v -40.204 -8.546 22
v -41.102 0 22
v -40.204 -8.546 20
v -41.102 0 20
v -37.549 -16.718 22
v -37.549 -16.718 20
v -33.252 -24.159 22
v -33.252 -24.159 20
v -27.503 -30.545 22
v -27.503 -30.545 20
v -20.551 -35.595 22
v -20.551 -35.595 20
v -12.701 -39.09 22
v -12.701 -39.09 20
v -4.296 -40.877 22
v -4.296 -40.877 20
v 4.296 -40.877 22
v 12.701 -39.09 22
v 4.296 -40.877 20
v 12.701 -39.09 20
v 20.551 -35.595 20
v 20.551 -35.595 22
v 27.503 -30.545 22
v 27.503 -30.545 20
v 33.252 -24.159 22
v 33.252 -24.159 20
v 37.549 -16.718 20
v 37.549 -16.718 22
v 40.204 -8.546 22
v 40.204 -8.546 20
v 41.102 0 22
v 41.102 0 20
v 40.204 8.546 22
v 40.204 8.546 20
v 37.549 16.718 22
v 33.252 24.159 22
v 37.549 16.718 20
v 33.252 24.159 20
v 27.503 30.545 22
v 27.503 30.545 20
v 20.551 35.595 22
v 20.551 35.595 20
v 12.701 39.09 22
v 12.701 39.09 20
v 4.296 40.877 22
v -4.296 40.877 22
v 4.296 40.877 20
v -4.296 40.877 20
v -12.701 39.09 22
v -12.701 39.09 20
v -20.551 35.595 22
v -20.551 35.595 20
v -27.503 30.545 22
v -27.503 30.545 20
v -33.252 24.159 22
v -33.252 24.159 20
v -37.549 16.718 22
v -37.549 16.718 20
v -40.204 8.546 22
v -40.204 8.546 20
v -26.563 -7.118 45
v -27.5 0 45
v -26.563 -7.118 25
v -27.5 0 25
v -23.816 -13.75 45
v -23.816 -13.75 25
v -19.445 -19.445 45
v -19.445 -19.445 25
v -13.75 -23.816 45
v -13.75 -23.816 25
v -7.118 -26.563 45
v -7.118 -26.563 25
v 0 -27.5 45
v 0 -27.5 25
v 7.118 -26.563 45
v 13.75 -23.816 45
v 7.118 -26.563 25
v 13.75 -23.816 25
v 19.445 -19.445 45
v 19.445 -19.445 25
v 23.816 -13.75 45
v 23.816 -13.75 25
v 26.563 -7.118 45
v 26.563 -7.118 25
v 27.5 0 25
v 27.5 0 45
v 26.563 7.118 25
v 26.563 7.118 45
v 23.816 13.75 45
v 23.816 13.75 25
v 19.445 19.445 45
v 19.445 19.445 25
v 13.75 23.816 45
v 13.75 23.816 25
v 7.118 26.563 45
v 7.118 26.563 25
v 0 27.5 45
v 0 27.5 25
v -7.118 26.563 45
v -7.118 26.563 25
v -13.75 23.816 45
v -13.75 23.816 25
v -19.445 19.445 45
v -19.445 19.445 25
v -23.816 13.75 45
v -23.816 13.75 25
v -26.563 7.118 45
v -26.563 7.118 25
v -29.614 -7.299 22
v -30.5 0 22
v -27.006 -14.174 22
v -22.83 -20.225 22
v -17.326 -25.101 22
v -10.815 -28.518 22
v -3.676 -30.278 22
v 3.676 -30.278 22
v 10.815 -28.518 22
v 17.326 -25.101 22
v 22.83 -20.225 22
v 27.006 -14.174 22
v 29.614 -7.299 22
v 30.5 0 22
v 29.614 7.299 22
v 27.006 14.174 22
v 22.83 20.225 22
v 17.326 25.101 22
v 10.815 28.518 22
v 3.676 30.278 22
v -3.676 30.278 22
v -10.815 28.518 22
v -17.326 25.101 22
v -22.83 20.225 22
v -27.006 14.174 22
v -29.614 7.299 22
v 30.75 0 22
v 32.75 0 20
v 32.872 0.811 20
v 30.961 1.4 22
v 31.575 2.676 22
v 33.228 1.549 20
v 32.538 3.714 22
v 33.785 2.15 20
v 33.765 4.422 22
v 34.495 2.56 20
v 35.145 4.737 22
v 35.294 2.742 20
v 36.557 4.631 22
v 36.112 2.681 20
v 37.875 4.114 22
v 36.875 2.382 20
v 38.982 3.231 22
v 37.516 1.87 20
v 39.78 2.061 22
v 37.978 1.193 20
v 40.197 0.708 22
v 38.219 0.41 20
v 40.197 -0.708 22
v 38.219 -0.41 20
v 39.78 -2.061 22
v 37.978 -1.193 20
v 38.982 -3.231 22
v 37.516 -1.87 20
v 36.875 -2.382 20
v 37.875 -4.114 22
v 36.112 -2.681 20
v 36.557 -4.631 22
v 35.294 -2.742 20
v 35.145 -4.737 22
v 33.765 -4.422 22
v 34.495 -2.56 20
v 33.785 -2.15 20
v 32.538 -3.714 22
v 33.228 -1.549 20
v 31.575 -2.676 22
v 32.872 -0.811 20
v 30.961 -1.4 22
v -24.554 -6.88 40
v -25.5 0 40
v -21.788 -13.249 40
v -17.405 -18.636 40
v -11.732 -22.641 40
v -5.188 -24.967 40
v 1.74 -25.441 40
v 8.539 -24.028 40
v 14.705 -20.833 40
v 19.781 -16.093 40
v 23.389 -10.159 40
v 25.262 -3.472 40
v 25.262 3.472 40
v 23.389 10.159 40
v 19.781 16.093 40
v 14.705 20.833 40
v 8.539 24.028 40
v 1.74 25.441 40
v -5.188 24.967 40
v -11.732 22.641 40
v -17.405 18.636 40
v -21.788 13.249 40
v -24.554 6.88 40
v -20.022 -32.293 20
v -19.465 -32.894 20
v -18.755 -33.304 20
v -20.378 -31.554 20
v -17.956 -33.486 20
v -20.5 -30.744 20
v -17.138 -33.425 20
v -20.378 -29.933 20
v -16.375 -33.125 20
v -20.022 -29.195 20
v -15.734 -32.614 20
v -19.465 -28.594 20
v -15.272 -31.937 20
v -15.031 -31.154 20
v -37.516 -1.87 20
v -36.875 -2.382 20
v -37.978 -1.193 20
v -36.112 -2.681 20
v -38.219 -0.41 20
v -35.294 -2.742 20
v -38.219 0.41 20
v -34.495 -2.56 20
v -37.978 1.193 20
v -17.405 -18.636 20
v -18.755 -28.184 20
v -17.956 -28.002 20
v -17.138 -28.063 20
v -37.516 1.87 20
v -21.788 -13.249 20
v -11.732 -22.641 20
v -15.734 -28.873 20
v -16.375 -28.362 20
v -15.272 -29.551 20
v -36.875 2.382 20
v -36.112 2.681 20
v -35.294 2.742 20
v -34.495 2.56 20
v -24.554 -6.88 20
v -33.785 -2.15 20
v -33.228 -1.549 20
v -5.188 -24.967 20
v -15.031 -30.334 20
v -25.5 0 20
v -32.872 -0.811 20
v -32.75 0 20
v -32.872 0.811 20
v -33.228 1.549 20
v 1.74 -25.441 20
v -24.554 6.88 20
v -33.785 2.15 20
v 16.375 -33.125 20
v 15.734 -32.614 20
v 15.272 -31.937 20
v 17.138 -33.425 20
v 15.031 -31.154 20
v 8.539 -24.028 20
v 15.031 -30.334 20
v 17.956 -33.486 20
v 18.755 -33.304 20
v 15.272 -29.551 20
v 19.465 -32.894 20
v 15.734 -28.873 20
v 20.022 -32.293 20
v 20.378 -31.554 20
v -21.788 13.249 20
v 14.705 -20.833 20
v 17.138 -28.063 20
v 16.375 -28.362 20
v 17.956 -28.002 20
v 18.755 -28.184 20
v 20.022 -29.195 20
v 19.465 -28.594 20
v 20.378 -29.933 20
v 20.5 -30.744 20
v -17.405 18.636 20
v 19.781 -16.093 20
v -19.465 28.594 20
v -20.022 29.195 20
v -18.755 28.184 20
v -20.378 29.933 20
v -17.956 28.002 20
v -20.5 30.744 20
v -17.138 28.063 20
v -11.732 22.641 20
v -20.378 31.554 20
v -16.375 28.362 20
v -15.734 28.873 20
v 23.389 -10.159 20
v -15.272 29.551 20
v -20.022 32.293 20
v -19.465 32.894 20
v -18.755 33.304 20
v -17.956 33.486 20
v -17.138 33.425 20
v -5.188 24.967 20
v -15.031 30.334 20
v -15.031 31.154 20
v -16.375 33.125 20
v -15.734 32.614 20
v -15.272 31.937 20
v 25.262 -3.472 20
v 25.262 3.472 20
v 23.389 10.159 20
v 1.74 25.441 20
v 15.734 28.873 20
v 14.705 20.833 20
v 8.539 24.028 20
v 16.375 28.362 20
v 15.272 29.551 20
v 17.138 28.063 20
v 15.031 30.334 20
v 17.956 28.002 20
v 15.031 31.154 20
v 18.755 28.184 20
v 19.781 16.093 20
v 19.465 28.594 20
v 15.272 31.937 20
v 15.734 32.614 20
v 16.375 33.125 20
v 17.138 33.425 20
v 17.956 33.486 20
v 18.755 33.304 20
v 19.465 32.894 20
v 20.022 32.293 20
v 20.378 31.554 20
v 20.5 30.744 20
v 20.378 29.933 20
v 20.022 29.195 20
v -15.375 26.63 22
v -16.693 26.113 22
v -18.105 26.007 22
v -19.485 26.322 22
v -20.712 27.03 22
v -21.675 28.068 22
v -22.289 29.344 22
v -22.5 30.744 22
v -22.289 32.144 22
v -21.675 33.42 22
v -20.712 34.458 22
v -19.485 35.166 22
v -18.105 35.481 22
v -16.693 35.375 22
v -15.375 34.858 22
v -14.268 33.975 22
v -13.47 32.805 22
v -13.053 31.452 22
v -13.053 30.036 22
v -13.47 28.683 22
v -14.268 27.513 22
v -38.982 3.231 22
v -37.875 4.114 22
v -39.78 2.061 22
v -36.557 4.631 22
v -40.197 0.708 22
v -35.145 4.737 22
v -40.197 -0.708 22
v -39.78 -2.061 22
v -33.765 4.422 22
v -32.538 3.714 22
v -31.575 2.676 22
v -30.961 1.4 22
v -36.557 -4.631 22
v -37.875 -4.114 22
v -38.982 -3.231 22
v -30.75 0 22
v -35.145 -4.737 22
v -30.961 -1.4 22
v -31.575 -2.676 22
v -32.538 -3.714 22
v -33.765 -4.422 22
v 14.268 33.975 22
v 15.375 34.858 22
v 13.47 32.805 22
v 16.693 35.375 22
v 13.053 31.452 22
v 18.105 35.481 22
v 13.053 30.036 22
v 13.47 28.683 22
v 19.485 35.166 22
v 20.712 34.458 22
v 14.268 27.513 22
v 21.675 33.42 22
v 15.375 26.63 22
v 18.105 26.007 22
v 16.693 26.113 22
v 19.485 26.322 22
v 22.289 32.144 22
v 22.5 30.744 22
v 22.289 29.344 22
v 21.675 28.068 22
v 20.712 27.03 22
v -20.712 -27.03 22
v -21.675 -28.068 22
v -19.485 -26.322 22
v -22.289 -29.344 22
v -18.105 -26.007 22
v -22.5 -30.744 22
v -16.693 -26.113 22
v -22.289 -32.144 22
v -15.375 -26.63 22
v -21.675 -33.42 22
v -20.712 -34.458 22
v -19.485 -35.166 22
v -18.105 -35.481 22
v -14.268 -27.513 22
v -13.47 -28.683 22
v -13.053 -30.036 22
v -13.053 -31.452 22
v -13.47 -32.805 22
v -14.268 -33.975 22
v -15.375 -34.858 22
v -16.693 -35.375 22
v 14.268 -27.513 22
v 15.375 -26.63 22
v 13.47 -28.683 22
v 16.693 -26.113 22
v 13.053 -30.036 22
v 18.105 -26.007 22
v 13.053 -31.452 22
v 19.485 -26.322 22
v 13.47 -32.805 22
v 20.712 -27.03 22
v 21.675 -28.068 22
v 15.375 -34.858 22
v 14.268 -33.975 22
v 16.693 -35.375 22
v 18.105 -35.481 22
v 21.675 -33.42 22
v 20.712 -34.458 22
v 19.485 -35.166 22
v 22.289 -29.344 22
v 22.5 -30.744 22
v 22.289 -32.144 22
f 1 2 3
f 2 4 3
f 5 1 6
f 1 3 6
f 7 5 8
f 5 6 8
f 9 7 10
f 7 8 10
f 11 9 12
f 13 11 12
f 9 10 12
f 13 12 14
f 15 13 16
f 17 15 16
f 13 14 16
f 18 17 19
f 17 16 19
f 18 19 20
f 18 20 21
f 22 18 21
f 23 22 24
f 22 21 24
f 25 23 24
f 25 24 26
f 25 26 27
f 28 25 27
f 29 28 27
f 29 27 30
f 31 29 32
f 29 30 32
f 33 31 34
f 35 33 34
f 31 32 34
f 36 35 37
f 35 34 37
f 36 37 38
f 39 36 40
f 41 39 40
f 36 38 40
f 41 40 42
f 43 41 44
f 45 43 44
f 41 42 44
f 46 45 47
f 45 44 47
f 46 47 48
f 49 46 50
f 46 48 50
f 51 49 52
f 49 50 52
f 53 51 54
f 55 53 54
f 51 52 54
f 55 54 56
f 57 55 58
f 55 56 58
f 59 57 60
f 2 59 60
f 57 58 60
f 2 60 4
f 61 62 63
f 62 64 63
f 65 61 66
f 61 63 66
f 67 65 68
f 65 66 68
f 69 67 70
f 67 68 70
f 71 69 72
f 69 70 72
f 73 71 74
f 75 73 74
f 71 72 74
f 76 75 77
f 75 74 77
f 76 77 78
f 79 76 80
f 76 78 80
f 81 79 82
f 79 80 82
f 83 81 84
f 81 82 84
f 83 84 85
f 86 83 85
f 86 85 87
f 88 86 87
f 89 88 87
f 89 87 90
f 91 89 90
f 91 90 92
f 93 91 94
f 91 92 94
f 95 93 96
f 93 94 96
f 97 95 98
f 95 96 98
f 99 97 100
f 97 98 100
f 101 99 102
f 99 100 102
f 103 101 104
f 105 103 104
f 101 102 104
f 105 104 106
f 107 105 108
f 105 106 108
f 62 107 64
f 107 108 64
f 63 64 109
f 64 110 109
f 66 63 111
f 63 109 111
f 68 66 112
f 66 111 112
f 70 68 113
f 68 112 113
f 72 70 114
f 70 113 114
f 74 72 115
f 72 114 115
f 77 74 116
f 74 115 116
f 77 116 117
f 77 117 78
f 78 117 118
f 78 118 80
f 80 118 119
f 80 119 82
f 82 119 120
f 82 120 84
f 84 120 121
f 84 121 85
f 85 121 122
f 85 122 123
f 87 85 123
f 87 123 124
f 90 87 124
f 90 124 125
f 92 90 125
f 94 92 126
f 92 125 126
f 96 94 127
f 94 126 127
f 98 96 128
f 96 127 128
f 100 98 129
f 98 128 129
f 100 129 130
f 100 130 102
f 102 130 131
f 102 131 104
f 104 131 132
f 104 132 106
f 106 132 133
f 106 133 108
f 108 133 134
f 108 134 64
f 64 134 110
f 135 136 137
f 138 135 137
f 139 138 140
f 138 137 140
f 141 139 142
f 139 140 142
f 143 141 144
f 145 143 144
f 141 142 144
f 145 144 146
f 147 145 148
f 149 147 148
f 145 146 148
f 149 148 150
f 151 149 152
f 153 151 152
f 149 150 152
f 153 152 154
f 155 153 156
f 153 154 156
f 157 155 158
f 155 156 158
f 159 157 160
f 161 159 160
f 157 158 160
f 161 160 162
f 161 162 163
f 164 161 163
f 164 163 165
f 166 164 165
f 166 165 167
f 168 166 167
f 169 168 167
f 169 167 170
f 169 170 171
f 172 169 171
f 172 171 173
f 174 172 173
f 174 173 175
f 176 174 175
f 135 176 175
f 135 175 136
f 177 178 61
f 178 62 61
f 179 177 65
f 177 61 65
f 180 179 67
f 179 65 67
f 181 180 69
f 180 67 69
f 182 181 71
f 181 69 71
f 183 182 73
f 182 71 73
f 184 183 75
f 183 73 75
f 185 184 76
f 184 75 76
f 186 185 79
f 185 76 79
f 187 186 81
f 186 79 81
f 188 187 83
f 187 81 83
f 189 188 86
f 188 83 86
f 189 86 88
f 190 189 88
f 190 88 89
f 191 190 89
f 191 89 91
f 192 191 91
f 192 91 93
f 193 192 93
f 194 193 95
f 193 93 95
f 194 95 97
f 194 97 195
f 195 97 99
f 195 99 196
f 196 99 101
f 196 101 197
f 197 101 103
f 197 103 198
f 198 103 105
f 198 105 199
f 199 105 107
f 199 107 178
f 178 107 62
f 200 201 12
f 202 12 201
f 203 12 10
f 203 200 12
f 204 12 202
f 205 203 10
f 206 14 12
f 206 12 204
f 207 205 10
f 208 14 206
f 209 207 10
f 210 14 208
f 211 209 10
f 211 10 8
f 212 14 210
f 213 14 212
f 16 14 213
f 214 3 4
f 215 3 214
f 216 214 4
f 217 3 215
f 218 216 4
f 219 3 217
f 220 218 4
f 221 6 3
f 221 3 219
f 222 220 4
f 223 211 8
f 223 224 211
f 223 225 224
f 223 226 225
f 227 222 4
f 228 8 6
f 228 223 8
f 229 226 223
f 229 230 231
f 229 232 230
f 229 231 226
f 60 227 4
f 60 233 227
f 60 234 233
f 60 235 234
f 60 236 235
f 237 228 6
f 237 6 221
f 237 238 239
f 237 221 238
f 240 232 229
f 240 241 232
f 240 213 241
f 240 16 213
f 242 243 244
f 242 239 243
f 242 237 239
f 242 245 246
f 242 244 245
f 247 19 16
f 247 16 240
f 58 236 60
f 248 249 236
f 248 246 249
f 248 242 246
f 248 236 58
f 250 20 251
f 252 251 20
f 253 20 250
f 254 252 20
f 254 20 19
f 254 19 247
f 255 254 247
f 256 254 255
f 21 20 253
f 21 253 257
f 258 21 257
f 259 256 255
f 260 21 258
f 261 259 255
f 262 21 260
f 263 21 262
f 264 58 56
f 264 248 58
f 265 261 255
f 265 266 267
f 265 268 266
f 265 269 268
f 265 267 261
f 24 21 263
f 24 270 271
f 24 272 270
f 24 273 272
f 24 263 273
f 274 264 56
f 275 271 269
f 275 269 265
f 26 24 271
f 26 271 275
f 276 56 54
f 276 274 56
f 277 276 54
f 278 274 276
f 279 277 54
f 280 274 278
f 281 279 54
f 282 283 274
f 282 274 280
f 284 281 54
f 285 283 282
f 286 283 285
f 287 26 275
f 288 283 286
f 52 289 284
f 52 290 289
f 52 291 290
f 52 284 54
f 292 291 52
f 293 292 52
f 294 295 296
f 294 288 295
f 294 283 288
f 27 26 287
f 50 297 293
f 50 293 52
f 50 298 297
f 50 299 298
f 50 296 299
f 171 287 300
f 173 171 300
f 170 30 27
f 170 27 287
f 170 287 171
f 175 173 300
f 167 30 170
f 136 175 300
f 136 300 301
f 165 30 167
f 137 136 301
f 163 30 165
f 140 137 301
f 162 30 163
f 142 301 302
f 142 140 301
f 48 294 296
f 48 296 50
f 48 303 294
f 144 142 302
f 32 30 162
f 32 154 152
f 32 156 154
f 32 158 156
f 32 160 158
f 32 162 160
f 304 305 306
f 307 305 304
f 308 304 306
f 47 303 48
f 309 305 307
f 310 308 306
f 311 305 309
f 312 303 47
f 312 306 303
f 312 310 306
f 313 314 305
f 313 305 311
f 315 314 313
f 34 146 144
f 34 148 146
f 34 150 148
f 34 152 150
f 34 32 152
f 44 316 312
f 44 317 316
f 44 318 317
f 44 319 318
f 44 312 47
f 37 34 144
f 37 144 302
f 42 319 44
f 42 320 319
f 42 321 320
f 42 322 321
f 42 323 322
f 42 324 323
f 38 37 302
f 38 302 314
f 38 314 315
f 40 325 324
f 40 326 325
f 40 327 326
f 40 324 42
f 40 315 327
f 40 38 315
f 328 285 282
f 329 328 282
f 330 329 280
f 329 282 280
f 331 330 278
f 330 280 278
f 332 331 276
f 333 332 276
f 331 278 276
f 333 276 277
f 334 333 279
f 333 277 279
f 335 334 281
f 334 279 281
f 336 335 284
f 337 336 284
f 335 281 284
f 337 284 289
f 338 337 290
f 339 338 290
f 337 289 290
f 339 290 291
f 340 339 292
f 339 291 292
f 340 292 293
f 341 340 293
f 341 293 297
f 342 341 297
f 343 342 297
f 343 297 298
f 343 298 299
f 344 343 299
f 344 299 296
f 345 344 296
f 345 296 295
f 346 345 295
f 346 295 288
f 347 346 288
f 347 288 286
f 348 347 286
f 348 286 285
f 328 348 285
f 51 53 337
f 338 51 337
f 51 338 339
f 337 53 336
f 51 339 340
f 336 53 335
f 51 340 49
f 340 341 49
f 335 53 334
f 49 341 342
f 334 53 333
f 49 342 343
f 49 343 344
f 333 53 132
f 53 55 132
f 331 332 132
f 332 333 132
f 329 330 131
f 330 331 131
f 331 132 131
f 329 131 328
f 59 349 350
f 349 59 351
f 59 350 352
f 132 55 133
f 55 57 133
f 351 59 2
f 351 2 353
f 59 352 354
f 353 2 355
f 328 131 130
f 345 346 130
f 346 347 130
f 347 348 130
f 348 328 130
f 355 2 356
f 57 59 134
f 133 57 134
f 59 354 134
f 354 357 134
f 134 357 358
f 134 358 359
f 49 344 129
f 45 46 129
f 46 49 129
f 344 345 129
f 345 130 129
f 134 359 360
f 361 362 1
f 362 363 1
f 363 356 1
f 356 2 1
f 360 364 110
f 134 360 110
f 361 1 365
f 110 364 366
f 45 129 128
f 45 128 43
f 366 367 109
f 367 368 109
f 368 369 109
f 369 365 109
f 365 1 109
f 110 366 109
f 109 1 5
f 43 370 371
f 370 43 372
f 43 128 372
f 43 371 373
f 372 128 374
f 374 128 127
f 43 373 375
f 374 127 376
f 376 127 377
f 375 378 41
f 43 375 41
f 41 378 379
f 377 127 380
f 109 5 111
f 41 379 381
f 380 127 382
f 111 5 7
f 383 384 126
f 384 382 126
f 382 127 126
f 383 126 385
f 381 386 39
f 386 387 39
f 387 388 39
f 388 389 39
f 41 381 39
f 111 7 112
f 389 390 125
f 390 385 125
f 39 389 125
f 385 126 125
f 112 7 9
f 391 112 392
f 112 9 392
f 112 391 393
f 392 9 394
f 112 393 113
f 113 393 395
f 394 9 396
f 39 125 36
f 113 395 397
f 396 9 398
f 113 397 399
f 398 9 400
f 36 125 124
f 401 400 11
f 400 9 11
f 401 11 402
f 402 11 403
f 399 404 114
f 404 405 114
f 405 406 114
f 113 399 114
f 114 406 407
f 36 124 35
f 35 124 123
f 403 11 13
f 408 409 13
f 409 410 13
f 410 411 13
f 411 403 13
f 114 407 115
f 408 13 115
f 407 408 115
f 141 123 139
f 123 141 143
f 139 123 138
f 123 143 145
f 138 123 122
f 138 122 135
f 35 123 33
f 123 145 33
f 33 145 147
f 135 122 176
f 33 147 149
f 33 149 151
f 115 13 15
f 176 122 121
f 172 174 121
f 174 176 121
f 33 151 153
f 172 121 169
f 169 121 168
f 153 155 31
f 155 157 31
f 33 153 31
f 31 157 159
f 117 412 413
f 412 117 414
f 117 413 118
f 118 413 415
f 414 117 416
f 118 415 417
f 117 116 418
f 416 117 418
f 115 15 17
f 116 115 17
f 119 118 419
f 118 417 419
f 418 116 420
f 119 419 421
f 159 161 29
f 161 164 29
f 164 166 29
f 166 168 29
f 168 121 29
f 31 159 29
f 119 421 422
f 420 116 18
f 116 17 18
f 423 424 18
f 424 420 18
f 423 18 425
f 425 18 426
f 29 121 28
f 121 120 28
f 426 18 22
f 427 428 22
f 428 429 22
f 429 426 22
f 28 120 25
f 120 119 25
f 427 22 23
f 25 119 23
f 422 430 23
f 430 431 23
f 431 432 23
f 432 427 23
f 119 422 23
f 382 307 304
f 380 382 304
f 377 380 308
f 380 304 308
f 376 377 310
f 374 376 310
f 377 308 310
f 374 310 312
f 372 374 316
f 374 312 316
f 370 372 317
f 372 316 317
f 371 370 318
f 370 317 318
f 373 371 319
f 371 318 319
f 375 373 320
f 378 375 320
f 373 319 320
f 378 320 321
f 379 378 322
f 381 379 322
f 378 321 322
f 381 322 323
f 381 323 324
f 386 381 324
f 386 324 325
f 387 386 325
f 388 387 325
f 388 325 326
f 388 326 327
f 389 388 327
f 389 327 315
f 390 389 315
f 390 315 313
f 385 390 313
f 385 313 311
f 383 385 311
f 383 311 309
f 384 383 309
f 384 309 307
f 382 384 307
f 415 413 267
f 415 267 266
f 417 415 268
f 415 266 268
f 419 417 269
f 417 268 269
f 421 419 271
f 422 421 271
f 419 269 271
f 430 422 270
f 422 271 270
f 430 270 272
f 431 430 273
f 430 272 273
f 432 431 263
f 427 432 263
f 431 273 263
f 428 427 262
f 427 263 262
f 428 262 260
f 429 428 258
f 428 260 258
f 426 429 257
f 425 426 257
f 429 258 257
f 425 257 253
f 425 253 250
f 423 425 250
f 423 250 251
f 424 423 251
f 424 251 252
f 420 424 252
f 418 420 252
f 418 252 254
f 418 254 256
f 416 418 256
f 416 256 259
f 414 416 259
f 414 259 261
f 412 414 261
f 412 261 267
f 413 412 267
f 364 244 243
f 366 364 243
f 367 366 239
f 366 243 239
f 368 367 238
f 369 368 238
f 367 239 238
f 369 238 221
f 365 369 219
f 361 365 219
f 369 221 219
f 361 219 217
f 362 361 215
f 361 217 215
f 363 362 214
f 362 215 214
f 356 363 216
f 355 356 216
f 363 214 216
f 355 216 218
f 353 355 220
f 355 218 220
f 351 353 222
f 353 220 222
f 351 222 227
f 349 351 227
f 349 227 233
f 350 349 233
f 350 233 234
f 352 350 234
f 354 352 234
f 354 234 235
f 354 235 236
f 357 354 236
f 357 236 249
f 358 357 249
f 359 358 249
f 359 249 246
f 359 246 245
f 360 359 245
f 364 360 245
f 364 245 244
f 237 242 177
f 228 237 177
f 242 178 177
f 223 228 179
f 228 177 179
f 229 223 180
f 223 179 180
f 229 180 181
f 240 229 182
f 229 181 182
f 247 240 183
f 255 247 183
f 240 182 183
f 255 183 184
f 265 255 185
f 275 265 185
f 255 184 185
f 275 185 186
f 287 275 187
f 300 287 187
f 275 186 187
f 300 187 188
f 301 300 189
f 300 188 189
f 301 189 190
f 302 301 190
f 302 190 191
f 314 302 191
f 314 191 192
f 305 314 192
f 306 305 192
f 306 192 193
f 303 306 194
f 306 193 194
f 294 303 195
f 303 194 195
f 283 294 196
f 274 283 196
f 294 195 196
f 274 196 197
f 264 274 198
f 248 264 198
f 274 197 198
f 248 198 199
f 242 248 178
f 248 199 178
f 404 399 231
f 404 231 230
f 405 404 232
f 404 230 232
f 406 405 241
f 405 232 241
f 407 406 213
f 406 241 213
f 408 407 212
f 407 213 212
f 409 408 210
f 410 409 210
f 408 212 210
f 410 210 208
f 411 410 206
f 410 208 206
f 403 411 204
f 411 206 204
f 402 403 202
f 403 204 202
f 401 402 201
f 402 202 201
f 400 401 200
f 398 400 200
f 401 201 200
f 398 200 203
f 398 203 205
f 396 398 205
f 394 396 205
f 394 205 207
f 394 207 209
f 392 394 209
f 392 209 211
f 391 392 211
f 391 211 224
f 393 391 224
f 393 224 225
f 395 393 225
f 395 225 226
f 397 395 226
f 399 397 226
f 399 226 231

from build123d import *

# Parameters (mm, degrees)
HOLE_D             = 4.5
HOLE_DEPTH         = 25
HOLE_CSINK_D       = 9.5
HOLE_CSINK_ANGLE   = 90
POLARPATTERN_COUNT = 6
SKETCH002_W        = 110
SKETCH002_H        = 70.917771
POCKET_DEPTH       = 41.103131
POCKET_DEPTH_BACK  = -41.103131


with BuildPart() as part:
    # Sketch → Revolution (revolve)
    with BuildSketch(Plane.XZ):
        Polygon((-27.5, 18), (-27.5, 0), (-25.5, 0), (-25.5, 40), (-27.5, 45), (-27.5, 25), (-30.5, 22), (-41.102131, 22), (-41.102131, 18), align=None)
    revolve(axis=Axis((0, 0, 0), (0, 0, 1)))

    # Hole
    with Locations(Plane(origin=(0, 0, 22), x_dir=(-1, 0, 0), z_dir=(0, 0, 1))):
        with Locations((35.5, 0)):
            hole = CounterSinkHole(HOLE_D / 2, HOLE_CSINK_D / 2, depth=HOLE_DEPTH, counter_sink_angle=HOLE_CSINK_ANGLE)

    # PolarPattern: Hole ×6 about axis
    polarpattern_axis = Axis((0, 0, 22), (0, 0, 1))
    for i in range(1, POLARPATTERN_COUNT):
        add(hole.rotate(polarpattern_axis, i * 360 / POLARPATTERN_COUNT), mode=Mode.SUBTRACT)

    # Sketch002 → Pocket (cut, two sides)
    with BuildSketch(Plane.YZ) as pocket_sk:
        with Locations((0, -15.458885)):
            Rectangle(SKETCH002_W, SKETCH002_H)
    extrude(amount=-POCKET_DEPTH, mode=Mode.SUBTRACT)
    extrude(pocket_sk.sketch, amount=-POCKET_DEPTH_BACK, mode=Mode.SUBTRACT)


solid = part.part
